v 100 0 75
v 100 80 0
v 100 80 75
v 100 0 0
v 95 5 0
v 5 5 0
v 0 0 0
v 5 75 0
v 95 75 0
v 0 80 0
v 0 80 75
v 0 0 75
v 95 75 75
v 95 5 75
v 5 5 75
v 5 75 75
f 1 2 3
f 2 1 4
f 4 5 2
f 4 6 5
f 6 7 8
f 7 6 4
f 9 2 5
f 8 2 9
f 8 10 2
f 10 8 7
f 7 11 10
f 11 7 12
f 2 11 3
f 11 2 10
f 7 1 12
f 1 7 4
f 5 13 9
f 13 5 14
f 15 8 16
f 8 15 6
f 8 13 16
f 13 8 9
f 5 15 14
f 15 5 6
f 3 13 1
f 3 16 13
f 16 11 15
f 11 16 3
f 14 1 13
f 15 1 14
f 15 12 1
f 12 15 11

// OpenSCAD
// Box with lid parameters
box_length = 100;      // [50:10:200]
box_width = 80;        // [40:10:200]
box_height = 60;       // [30:10:150]
wall_thickness = 5;    // [2:1:15]
lid_height = 15;       // [5:1:50]
base_color = "LightBlue";
lid_color = "LightGreen";

module box_base() {
    color(base_color)
    difference() {
        cube([box_length, box_width, box_height]);
        translate([wall_thickness, wall_thickness, 0])
        cube([box_length - 2*wall_thickness, box_width - 2*wall_thickness, box_height]);
    }
}

module box_lid() {
    color(lid_color)
    translate([0, 0, box_height])
    difference() {
        cube([box_length, box_width, lid_height]);
        translate([wall_thickness, wall_thickness, -0.1])
        cube([box_length - 2*wall_thickness, box_width - 2*wall_thickness, lid_height + 0.2]);
    }
}

box_base();
box_lid();
